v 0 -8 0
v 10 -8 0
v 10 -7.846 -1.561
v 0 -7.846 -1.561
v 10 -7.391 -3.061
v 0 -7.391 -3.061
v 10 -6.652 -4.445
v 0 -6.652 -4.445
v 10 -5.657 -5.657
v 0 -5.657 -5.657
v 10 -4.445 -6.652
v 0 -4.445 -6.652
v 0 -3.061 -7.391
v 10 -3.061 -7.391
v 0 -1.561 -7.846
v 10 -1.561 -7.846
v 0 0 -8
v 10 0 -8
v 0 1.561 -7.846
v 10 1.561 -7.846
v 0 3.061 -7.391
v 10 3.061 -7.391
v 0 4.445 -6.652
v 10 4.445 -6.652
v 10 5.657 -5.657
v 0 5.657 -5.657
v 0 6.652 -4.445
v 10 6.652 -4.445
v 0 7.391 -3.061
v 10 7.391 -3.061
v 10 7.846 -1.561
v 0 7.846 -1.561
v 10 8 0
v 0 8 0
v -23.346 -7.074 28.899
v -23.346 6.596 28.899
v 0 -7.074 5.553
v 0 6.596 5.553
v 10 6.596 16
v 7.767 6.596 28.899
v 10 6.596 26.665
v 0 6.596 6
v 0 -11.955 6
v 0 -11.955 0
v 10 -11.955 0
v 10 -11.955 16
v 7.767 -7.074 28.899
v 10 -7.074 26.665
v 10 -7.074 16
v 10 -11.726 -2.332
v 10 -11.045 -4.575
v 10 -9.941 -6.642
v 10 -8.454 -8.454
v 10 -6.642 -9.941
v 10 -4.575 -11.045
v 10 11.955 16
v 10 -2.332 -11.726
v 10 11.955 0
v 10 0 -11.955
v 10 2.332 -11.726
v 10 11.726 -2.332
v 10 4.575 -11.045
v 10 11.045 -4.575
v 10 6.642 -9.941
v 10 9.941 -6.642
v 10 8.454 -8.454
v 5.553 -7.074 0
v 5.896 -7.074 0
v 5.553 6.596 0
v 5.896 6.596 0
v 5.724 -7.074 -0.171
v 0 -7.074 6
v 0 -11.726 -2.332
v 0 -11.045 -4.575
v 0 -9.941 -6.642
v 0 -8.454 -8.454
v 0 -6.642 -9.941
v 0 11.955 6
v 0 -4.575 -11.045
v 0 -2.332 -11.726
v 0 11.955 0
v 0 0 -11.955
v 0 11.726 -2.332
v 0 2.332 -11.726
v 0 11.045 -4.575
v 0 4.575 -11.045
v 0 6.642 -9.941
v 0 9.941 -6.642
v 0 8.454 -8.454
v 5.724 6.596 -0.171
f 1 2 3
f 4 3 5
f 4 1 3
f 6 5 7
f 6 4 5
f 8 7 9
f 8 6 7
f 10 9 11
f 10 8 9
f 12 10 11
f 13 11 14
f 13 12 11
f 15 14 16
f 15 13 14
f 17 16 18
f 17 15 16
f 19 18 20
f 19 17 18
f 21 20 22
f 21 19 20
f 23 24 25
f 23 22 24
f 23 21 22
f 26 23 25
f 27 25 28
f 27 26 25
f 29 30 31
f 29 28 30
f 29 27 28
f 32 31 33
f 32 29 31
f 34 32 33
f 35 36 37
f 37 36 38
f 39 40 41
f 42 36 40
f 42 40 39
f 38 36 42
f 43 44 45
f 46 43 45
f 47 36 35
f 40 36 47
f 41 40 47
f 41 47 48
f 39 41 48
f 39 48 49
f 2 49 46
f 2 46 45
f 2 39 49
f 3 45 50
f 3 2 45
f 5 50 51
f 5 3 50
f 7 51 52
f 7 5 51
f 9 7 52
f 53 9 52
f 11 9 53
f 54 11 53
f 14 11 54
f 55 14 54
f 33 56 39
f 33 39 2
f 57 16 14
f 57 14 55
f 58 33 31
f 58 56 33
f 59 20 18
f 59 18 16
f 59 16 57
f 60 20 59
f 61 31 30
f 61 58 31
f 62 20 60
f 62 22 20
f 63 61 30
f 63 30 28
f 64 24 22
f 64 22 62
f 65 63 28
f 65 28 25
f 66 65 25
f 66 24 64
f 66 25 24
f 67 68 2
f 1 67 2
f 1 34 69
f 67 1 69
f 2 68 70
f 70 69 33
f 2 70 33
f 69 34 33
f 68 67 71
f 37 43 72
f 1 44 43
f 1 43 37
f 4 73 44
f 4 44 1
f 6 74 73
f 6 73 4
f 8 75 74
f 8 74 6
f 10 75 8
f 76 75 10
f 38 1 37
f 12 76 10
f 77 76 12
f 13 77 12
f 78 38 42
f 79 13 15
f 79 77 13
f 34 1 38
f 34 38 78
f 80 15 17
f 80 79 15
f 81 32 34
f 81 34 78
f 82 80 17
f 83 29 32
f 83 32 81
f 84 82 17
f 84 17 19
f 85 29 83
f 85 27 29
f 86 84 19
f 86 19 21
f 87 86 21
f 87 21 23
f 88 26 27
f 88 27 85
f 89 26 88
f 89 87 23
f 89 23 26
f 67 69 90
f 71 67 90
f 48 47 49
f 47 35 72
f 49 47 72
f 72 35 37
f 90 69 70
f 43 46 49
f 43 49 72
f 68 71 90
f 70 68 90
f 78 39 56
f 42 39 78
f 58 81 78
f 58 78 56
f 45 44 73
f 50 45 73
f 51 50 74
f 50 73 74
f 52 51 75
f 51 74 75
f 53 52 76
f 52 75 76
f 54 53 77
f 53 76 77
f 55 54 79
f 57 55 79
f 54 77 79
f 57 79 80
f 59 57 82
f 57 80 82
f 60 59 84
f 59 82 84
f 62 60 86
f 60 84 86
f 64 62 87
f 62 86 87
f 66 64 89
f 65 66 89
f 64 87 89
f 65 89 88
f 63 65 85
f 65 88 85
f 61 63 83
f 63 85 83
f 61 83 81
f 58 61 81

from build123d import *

# Parameters (mm, degrees)
SZKIC1_R                         = 11.955497861
SZKIC1_R_2                       = 8
DODANIE_WYCI_GNI_CIE1_DEPTH      = 10
SZKIC2_W                         = 10
SZKIC2_H                         = 23.910995722
DODANIE_WYCI_GNI_CIE2_DEPTH      = 21
SFAZOWANIE1_SIZE                 = 15
SZKIC4_W                         = 9.112824073
SZKIC4_H                         = 13.669236109
DODANIE_WYCI_GNI_CIE4_DEPTH      = 33
DODANIE_WYCI_GNI_CIE5_DEPTH      = 10
DODANIE_WYCI_GNI_CIE5_DEPTH_BACK = 12
SZKIC5_W                         = 41.411530905
SZKIC5_H                         = 13.669236109
SZKIC6_W                         = 16.08298615
SZKIC6_H                         = 27.20632334
WYTNIJ_WYCI_GNI_CIE1_DEPTH       = 54.798638821
WYTNIJ_WYCI_GNI_CIE2_DEPTH       = 54.798638821


with BuildPart() as part:
    # Szkic1 → Dodanie-wyciągnięcie1 (new body)
    with BuildSketch(Plane(origin=(0, 0, 0), x_dir=(0, 0, -1), z_dir=(1, 0, 0))):
        Circle(SZKIC1_R)
        Circle(SZKIC1_R_2, mode=Mode.SUBTRACT)
    extrude(amount=DODANIE_WYCI_GNI_CIE1_DEPTH)

    # Szkic2 → Dodanie-wyciągnięcie2 (add)
    with BuildSketch(Plane.XY):
        with Locations((5, 0)):
            Rectangle(SZKIC2_W, SZKIC2_H)
    extrude(amount=DODANIE_WYCI_GNI_CIE2_DEPTH)

    # Sfazowanie1
    # the kernel refuses this chamfer: 15 mm, written as the material it takes off along each edge
    with BuildSketch(Plane(origin=(0, -50.53074268, 21), x_dir=(0.9996219169112968, 0, 0.02749587661058632), z_dir=(0, 1, 0))) as sfazowanie1_piece_1:
        Polygon((SFAZOWANIE1_SIZE * 0.999621916911, SFAZOWANIE1_SIZE * 0.0274958766106), (-SFAZOWANIE1_SIZE * 0.0274958766106, SFAZOWANIE1_SIZE * 0.999621916911), (0, 0), align=None)
    extrude(amount=101.06148536, mode=Mode.SUBTRACT)

    # Szkic4 → Dodanie-wyciągnięcie4 (add)
    with BuildSketch(Plane(origin=(-3, 0, 3), x_dir=(0.7071067811865513, 0, 0.7071067811865438), z_dir=(-0.7071067811865438, 0, 0.7071067811865513))):
        with Locations((11.369948619, -0.23897266)):
            Rectangle(SZKIC4_W, SZKIC4_H)
    extrude(amount=DODANIE_WYCI_GNI_CIE4_DEPTH)

    # Szkic5 → Dodanie-wyciągnięcie5 (add, two sides: drawn at the far end of the back side and taken through both)
    with BuildSketch(Plane(origin=(11.261637619, 0, 11.261637619), x_dir=(0.7071067811865438, 0, -0.7071067811865512), z_dir=(0.7071067811865512, 0, 0.7071067811865438)).offset(-DODANIE_WYCI_GNI_CIE5_DEPTH_BACK)):
        with Locations((-16.536875235, -0.23897266)):
            Rectangle(SZKIC5_W, SZKIC5_H)
    extrude(amount=DODANIE_WYCI_GNI_CIE5_DEPTH + DODANIE_WYCI_GNI_CIE5_DEPTH_BACK)

    # Szkic6 → Wytnij-wyciągnięcie1 (cut, through all)
    with BuildSketch(Plane(origin=(0, 6.595645395, 0), x_dir=(1, 0, 0), z_dir=(0, 1, 0))):
        with Locations((18.041493075, -17.707460584)):
            Rectangle(SZKIC6_W, SZKIC6_H)
    extrude(amount=-WYTNIJ_WYCI_GNI_CIE1_DEPTH, mode=Mode.SUBTRACT)

    # Szkic7 → Wytnij-wyciągnięcie2 (cut, through all)
    with BuildSketch(Plane(origin=(0, 6.595645395, 0), x_dir=(1, 0, 0), z_dir=(0, 1, 0))):
        Polygon((-23.770482817, -28.898564741), (9.416159533, -28.898564741), (9.416159533, -47.919361128), (-20.148773981, -47.919361128), align=None)
    extrude(amount=-WYTNIJ_WYCI_GNI_CIE2_DEPTH, mode=Mode.SUBTRACT)


solid = part.part
